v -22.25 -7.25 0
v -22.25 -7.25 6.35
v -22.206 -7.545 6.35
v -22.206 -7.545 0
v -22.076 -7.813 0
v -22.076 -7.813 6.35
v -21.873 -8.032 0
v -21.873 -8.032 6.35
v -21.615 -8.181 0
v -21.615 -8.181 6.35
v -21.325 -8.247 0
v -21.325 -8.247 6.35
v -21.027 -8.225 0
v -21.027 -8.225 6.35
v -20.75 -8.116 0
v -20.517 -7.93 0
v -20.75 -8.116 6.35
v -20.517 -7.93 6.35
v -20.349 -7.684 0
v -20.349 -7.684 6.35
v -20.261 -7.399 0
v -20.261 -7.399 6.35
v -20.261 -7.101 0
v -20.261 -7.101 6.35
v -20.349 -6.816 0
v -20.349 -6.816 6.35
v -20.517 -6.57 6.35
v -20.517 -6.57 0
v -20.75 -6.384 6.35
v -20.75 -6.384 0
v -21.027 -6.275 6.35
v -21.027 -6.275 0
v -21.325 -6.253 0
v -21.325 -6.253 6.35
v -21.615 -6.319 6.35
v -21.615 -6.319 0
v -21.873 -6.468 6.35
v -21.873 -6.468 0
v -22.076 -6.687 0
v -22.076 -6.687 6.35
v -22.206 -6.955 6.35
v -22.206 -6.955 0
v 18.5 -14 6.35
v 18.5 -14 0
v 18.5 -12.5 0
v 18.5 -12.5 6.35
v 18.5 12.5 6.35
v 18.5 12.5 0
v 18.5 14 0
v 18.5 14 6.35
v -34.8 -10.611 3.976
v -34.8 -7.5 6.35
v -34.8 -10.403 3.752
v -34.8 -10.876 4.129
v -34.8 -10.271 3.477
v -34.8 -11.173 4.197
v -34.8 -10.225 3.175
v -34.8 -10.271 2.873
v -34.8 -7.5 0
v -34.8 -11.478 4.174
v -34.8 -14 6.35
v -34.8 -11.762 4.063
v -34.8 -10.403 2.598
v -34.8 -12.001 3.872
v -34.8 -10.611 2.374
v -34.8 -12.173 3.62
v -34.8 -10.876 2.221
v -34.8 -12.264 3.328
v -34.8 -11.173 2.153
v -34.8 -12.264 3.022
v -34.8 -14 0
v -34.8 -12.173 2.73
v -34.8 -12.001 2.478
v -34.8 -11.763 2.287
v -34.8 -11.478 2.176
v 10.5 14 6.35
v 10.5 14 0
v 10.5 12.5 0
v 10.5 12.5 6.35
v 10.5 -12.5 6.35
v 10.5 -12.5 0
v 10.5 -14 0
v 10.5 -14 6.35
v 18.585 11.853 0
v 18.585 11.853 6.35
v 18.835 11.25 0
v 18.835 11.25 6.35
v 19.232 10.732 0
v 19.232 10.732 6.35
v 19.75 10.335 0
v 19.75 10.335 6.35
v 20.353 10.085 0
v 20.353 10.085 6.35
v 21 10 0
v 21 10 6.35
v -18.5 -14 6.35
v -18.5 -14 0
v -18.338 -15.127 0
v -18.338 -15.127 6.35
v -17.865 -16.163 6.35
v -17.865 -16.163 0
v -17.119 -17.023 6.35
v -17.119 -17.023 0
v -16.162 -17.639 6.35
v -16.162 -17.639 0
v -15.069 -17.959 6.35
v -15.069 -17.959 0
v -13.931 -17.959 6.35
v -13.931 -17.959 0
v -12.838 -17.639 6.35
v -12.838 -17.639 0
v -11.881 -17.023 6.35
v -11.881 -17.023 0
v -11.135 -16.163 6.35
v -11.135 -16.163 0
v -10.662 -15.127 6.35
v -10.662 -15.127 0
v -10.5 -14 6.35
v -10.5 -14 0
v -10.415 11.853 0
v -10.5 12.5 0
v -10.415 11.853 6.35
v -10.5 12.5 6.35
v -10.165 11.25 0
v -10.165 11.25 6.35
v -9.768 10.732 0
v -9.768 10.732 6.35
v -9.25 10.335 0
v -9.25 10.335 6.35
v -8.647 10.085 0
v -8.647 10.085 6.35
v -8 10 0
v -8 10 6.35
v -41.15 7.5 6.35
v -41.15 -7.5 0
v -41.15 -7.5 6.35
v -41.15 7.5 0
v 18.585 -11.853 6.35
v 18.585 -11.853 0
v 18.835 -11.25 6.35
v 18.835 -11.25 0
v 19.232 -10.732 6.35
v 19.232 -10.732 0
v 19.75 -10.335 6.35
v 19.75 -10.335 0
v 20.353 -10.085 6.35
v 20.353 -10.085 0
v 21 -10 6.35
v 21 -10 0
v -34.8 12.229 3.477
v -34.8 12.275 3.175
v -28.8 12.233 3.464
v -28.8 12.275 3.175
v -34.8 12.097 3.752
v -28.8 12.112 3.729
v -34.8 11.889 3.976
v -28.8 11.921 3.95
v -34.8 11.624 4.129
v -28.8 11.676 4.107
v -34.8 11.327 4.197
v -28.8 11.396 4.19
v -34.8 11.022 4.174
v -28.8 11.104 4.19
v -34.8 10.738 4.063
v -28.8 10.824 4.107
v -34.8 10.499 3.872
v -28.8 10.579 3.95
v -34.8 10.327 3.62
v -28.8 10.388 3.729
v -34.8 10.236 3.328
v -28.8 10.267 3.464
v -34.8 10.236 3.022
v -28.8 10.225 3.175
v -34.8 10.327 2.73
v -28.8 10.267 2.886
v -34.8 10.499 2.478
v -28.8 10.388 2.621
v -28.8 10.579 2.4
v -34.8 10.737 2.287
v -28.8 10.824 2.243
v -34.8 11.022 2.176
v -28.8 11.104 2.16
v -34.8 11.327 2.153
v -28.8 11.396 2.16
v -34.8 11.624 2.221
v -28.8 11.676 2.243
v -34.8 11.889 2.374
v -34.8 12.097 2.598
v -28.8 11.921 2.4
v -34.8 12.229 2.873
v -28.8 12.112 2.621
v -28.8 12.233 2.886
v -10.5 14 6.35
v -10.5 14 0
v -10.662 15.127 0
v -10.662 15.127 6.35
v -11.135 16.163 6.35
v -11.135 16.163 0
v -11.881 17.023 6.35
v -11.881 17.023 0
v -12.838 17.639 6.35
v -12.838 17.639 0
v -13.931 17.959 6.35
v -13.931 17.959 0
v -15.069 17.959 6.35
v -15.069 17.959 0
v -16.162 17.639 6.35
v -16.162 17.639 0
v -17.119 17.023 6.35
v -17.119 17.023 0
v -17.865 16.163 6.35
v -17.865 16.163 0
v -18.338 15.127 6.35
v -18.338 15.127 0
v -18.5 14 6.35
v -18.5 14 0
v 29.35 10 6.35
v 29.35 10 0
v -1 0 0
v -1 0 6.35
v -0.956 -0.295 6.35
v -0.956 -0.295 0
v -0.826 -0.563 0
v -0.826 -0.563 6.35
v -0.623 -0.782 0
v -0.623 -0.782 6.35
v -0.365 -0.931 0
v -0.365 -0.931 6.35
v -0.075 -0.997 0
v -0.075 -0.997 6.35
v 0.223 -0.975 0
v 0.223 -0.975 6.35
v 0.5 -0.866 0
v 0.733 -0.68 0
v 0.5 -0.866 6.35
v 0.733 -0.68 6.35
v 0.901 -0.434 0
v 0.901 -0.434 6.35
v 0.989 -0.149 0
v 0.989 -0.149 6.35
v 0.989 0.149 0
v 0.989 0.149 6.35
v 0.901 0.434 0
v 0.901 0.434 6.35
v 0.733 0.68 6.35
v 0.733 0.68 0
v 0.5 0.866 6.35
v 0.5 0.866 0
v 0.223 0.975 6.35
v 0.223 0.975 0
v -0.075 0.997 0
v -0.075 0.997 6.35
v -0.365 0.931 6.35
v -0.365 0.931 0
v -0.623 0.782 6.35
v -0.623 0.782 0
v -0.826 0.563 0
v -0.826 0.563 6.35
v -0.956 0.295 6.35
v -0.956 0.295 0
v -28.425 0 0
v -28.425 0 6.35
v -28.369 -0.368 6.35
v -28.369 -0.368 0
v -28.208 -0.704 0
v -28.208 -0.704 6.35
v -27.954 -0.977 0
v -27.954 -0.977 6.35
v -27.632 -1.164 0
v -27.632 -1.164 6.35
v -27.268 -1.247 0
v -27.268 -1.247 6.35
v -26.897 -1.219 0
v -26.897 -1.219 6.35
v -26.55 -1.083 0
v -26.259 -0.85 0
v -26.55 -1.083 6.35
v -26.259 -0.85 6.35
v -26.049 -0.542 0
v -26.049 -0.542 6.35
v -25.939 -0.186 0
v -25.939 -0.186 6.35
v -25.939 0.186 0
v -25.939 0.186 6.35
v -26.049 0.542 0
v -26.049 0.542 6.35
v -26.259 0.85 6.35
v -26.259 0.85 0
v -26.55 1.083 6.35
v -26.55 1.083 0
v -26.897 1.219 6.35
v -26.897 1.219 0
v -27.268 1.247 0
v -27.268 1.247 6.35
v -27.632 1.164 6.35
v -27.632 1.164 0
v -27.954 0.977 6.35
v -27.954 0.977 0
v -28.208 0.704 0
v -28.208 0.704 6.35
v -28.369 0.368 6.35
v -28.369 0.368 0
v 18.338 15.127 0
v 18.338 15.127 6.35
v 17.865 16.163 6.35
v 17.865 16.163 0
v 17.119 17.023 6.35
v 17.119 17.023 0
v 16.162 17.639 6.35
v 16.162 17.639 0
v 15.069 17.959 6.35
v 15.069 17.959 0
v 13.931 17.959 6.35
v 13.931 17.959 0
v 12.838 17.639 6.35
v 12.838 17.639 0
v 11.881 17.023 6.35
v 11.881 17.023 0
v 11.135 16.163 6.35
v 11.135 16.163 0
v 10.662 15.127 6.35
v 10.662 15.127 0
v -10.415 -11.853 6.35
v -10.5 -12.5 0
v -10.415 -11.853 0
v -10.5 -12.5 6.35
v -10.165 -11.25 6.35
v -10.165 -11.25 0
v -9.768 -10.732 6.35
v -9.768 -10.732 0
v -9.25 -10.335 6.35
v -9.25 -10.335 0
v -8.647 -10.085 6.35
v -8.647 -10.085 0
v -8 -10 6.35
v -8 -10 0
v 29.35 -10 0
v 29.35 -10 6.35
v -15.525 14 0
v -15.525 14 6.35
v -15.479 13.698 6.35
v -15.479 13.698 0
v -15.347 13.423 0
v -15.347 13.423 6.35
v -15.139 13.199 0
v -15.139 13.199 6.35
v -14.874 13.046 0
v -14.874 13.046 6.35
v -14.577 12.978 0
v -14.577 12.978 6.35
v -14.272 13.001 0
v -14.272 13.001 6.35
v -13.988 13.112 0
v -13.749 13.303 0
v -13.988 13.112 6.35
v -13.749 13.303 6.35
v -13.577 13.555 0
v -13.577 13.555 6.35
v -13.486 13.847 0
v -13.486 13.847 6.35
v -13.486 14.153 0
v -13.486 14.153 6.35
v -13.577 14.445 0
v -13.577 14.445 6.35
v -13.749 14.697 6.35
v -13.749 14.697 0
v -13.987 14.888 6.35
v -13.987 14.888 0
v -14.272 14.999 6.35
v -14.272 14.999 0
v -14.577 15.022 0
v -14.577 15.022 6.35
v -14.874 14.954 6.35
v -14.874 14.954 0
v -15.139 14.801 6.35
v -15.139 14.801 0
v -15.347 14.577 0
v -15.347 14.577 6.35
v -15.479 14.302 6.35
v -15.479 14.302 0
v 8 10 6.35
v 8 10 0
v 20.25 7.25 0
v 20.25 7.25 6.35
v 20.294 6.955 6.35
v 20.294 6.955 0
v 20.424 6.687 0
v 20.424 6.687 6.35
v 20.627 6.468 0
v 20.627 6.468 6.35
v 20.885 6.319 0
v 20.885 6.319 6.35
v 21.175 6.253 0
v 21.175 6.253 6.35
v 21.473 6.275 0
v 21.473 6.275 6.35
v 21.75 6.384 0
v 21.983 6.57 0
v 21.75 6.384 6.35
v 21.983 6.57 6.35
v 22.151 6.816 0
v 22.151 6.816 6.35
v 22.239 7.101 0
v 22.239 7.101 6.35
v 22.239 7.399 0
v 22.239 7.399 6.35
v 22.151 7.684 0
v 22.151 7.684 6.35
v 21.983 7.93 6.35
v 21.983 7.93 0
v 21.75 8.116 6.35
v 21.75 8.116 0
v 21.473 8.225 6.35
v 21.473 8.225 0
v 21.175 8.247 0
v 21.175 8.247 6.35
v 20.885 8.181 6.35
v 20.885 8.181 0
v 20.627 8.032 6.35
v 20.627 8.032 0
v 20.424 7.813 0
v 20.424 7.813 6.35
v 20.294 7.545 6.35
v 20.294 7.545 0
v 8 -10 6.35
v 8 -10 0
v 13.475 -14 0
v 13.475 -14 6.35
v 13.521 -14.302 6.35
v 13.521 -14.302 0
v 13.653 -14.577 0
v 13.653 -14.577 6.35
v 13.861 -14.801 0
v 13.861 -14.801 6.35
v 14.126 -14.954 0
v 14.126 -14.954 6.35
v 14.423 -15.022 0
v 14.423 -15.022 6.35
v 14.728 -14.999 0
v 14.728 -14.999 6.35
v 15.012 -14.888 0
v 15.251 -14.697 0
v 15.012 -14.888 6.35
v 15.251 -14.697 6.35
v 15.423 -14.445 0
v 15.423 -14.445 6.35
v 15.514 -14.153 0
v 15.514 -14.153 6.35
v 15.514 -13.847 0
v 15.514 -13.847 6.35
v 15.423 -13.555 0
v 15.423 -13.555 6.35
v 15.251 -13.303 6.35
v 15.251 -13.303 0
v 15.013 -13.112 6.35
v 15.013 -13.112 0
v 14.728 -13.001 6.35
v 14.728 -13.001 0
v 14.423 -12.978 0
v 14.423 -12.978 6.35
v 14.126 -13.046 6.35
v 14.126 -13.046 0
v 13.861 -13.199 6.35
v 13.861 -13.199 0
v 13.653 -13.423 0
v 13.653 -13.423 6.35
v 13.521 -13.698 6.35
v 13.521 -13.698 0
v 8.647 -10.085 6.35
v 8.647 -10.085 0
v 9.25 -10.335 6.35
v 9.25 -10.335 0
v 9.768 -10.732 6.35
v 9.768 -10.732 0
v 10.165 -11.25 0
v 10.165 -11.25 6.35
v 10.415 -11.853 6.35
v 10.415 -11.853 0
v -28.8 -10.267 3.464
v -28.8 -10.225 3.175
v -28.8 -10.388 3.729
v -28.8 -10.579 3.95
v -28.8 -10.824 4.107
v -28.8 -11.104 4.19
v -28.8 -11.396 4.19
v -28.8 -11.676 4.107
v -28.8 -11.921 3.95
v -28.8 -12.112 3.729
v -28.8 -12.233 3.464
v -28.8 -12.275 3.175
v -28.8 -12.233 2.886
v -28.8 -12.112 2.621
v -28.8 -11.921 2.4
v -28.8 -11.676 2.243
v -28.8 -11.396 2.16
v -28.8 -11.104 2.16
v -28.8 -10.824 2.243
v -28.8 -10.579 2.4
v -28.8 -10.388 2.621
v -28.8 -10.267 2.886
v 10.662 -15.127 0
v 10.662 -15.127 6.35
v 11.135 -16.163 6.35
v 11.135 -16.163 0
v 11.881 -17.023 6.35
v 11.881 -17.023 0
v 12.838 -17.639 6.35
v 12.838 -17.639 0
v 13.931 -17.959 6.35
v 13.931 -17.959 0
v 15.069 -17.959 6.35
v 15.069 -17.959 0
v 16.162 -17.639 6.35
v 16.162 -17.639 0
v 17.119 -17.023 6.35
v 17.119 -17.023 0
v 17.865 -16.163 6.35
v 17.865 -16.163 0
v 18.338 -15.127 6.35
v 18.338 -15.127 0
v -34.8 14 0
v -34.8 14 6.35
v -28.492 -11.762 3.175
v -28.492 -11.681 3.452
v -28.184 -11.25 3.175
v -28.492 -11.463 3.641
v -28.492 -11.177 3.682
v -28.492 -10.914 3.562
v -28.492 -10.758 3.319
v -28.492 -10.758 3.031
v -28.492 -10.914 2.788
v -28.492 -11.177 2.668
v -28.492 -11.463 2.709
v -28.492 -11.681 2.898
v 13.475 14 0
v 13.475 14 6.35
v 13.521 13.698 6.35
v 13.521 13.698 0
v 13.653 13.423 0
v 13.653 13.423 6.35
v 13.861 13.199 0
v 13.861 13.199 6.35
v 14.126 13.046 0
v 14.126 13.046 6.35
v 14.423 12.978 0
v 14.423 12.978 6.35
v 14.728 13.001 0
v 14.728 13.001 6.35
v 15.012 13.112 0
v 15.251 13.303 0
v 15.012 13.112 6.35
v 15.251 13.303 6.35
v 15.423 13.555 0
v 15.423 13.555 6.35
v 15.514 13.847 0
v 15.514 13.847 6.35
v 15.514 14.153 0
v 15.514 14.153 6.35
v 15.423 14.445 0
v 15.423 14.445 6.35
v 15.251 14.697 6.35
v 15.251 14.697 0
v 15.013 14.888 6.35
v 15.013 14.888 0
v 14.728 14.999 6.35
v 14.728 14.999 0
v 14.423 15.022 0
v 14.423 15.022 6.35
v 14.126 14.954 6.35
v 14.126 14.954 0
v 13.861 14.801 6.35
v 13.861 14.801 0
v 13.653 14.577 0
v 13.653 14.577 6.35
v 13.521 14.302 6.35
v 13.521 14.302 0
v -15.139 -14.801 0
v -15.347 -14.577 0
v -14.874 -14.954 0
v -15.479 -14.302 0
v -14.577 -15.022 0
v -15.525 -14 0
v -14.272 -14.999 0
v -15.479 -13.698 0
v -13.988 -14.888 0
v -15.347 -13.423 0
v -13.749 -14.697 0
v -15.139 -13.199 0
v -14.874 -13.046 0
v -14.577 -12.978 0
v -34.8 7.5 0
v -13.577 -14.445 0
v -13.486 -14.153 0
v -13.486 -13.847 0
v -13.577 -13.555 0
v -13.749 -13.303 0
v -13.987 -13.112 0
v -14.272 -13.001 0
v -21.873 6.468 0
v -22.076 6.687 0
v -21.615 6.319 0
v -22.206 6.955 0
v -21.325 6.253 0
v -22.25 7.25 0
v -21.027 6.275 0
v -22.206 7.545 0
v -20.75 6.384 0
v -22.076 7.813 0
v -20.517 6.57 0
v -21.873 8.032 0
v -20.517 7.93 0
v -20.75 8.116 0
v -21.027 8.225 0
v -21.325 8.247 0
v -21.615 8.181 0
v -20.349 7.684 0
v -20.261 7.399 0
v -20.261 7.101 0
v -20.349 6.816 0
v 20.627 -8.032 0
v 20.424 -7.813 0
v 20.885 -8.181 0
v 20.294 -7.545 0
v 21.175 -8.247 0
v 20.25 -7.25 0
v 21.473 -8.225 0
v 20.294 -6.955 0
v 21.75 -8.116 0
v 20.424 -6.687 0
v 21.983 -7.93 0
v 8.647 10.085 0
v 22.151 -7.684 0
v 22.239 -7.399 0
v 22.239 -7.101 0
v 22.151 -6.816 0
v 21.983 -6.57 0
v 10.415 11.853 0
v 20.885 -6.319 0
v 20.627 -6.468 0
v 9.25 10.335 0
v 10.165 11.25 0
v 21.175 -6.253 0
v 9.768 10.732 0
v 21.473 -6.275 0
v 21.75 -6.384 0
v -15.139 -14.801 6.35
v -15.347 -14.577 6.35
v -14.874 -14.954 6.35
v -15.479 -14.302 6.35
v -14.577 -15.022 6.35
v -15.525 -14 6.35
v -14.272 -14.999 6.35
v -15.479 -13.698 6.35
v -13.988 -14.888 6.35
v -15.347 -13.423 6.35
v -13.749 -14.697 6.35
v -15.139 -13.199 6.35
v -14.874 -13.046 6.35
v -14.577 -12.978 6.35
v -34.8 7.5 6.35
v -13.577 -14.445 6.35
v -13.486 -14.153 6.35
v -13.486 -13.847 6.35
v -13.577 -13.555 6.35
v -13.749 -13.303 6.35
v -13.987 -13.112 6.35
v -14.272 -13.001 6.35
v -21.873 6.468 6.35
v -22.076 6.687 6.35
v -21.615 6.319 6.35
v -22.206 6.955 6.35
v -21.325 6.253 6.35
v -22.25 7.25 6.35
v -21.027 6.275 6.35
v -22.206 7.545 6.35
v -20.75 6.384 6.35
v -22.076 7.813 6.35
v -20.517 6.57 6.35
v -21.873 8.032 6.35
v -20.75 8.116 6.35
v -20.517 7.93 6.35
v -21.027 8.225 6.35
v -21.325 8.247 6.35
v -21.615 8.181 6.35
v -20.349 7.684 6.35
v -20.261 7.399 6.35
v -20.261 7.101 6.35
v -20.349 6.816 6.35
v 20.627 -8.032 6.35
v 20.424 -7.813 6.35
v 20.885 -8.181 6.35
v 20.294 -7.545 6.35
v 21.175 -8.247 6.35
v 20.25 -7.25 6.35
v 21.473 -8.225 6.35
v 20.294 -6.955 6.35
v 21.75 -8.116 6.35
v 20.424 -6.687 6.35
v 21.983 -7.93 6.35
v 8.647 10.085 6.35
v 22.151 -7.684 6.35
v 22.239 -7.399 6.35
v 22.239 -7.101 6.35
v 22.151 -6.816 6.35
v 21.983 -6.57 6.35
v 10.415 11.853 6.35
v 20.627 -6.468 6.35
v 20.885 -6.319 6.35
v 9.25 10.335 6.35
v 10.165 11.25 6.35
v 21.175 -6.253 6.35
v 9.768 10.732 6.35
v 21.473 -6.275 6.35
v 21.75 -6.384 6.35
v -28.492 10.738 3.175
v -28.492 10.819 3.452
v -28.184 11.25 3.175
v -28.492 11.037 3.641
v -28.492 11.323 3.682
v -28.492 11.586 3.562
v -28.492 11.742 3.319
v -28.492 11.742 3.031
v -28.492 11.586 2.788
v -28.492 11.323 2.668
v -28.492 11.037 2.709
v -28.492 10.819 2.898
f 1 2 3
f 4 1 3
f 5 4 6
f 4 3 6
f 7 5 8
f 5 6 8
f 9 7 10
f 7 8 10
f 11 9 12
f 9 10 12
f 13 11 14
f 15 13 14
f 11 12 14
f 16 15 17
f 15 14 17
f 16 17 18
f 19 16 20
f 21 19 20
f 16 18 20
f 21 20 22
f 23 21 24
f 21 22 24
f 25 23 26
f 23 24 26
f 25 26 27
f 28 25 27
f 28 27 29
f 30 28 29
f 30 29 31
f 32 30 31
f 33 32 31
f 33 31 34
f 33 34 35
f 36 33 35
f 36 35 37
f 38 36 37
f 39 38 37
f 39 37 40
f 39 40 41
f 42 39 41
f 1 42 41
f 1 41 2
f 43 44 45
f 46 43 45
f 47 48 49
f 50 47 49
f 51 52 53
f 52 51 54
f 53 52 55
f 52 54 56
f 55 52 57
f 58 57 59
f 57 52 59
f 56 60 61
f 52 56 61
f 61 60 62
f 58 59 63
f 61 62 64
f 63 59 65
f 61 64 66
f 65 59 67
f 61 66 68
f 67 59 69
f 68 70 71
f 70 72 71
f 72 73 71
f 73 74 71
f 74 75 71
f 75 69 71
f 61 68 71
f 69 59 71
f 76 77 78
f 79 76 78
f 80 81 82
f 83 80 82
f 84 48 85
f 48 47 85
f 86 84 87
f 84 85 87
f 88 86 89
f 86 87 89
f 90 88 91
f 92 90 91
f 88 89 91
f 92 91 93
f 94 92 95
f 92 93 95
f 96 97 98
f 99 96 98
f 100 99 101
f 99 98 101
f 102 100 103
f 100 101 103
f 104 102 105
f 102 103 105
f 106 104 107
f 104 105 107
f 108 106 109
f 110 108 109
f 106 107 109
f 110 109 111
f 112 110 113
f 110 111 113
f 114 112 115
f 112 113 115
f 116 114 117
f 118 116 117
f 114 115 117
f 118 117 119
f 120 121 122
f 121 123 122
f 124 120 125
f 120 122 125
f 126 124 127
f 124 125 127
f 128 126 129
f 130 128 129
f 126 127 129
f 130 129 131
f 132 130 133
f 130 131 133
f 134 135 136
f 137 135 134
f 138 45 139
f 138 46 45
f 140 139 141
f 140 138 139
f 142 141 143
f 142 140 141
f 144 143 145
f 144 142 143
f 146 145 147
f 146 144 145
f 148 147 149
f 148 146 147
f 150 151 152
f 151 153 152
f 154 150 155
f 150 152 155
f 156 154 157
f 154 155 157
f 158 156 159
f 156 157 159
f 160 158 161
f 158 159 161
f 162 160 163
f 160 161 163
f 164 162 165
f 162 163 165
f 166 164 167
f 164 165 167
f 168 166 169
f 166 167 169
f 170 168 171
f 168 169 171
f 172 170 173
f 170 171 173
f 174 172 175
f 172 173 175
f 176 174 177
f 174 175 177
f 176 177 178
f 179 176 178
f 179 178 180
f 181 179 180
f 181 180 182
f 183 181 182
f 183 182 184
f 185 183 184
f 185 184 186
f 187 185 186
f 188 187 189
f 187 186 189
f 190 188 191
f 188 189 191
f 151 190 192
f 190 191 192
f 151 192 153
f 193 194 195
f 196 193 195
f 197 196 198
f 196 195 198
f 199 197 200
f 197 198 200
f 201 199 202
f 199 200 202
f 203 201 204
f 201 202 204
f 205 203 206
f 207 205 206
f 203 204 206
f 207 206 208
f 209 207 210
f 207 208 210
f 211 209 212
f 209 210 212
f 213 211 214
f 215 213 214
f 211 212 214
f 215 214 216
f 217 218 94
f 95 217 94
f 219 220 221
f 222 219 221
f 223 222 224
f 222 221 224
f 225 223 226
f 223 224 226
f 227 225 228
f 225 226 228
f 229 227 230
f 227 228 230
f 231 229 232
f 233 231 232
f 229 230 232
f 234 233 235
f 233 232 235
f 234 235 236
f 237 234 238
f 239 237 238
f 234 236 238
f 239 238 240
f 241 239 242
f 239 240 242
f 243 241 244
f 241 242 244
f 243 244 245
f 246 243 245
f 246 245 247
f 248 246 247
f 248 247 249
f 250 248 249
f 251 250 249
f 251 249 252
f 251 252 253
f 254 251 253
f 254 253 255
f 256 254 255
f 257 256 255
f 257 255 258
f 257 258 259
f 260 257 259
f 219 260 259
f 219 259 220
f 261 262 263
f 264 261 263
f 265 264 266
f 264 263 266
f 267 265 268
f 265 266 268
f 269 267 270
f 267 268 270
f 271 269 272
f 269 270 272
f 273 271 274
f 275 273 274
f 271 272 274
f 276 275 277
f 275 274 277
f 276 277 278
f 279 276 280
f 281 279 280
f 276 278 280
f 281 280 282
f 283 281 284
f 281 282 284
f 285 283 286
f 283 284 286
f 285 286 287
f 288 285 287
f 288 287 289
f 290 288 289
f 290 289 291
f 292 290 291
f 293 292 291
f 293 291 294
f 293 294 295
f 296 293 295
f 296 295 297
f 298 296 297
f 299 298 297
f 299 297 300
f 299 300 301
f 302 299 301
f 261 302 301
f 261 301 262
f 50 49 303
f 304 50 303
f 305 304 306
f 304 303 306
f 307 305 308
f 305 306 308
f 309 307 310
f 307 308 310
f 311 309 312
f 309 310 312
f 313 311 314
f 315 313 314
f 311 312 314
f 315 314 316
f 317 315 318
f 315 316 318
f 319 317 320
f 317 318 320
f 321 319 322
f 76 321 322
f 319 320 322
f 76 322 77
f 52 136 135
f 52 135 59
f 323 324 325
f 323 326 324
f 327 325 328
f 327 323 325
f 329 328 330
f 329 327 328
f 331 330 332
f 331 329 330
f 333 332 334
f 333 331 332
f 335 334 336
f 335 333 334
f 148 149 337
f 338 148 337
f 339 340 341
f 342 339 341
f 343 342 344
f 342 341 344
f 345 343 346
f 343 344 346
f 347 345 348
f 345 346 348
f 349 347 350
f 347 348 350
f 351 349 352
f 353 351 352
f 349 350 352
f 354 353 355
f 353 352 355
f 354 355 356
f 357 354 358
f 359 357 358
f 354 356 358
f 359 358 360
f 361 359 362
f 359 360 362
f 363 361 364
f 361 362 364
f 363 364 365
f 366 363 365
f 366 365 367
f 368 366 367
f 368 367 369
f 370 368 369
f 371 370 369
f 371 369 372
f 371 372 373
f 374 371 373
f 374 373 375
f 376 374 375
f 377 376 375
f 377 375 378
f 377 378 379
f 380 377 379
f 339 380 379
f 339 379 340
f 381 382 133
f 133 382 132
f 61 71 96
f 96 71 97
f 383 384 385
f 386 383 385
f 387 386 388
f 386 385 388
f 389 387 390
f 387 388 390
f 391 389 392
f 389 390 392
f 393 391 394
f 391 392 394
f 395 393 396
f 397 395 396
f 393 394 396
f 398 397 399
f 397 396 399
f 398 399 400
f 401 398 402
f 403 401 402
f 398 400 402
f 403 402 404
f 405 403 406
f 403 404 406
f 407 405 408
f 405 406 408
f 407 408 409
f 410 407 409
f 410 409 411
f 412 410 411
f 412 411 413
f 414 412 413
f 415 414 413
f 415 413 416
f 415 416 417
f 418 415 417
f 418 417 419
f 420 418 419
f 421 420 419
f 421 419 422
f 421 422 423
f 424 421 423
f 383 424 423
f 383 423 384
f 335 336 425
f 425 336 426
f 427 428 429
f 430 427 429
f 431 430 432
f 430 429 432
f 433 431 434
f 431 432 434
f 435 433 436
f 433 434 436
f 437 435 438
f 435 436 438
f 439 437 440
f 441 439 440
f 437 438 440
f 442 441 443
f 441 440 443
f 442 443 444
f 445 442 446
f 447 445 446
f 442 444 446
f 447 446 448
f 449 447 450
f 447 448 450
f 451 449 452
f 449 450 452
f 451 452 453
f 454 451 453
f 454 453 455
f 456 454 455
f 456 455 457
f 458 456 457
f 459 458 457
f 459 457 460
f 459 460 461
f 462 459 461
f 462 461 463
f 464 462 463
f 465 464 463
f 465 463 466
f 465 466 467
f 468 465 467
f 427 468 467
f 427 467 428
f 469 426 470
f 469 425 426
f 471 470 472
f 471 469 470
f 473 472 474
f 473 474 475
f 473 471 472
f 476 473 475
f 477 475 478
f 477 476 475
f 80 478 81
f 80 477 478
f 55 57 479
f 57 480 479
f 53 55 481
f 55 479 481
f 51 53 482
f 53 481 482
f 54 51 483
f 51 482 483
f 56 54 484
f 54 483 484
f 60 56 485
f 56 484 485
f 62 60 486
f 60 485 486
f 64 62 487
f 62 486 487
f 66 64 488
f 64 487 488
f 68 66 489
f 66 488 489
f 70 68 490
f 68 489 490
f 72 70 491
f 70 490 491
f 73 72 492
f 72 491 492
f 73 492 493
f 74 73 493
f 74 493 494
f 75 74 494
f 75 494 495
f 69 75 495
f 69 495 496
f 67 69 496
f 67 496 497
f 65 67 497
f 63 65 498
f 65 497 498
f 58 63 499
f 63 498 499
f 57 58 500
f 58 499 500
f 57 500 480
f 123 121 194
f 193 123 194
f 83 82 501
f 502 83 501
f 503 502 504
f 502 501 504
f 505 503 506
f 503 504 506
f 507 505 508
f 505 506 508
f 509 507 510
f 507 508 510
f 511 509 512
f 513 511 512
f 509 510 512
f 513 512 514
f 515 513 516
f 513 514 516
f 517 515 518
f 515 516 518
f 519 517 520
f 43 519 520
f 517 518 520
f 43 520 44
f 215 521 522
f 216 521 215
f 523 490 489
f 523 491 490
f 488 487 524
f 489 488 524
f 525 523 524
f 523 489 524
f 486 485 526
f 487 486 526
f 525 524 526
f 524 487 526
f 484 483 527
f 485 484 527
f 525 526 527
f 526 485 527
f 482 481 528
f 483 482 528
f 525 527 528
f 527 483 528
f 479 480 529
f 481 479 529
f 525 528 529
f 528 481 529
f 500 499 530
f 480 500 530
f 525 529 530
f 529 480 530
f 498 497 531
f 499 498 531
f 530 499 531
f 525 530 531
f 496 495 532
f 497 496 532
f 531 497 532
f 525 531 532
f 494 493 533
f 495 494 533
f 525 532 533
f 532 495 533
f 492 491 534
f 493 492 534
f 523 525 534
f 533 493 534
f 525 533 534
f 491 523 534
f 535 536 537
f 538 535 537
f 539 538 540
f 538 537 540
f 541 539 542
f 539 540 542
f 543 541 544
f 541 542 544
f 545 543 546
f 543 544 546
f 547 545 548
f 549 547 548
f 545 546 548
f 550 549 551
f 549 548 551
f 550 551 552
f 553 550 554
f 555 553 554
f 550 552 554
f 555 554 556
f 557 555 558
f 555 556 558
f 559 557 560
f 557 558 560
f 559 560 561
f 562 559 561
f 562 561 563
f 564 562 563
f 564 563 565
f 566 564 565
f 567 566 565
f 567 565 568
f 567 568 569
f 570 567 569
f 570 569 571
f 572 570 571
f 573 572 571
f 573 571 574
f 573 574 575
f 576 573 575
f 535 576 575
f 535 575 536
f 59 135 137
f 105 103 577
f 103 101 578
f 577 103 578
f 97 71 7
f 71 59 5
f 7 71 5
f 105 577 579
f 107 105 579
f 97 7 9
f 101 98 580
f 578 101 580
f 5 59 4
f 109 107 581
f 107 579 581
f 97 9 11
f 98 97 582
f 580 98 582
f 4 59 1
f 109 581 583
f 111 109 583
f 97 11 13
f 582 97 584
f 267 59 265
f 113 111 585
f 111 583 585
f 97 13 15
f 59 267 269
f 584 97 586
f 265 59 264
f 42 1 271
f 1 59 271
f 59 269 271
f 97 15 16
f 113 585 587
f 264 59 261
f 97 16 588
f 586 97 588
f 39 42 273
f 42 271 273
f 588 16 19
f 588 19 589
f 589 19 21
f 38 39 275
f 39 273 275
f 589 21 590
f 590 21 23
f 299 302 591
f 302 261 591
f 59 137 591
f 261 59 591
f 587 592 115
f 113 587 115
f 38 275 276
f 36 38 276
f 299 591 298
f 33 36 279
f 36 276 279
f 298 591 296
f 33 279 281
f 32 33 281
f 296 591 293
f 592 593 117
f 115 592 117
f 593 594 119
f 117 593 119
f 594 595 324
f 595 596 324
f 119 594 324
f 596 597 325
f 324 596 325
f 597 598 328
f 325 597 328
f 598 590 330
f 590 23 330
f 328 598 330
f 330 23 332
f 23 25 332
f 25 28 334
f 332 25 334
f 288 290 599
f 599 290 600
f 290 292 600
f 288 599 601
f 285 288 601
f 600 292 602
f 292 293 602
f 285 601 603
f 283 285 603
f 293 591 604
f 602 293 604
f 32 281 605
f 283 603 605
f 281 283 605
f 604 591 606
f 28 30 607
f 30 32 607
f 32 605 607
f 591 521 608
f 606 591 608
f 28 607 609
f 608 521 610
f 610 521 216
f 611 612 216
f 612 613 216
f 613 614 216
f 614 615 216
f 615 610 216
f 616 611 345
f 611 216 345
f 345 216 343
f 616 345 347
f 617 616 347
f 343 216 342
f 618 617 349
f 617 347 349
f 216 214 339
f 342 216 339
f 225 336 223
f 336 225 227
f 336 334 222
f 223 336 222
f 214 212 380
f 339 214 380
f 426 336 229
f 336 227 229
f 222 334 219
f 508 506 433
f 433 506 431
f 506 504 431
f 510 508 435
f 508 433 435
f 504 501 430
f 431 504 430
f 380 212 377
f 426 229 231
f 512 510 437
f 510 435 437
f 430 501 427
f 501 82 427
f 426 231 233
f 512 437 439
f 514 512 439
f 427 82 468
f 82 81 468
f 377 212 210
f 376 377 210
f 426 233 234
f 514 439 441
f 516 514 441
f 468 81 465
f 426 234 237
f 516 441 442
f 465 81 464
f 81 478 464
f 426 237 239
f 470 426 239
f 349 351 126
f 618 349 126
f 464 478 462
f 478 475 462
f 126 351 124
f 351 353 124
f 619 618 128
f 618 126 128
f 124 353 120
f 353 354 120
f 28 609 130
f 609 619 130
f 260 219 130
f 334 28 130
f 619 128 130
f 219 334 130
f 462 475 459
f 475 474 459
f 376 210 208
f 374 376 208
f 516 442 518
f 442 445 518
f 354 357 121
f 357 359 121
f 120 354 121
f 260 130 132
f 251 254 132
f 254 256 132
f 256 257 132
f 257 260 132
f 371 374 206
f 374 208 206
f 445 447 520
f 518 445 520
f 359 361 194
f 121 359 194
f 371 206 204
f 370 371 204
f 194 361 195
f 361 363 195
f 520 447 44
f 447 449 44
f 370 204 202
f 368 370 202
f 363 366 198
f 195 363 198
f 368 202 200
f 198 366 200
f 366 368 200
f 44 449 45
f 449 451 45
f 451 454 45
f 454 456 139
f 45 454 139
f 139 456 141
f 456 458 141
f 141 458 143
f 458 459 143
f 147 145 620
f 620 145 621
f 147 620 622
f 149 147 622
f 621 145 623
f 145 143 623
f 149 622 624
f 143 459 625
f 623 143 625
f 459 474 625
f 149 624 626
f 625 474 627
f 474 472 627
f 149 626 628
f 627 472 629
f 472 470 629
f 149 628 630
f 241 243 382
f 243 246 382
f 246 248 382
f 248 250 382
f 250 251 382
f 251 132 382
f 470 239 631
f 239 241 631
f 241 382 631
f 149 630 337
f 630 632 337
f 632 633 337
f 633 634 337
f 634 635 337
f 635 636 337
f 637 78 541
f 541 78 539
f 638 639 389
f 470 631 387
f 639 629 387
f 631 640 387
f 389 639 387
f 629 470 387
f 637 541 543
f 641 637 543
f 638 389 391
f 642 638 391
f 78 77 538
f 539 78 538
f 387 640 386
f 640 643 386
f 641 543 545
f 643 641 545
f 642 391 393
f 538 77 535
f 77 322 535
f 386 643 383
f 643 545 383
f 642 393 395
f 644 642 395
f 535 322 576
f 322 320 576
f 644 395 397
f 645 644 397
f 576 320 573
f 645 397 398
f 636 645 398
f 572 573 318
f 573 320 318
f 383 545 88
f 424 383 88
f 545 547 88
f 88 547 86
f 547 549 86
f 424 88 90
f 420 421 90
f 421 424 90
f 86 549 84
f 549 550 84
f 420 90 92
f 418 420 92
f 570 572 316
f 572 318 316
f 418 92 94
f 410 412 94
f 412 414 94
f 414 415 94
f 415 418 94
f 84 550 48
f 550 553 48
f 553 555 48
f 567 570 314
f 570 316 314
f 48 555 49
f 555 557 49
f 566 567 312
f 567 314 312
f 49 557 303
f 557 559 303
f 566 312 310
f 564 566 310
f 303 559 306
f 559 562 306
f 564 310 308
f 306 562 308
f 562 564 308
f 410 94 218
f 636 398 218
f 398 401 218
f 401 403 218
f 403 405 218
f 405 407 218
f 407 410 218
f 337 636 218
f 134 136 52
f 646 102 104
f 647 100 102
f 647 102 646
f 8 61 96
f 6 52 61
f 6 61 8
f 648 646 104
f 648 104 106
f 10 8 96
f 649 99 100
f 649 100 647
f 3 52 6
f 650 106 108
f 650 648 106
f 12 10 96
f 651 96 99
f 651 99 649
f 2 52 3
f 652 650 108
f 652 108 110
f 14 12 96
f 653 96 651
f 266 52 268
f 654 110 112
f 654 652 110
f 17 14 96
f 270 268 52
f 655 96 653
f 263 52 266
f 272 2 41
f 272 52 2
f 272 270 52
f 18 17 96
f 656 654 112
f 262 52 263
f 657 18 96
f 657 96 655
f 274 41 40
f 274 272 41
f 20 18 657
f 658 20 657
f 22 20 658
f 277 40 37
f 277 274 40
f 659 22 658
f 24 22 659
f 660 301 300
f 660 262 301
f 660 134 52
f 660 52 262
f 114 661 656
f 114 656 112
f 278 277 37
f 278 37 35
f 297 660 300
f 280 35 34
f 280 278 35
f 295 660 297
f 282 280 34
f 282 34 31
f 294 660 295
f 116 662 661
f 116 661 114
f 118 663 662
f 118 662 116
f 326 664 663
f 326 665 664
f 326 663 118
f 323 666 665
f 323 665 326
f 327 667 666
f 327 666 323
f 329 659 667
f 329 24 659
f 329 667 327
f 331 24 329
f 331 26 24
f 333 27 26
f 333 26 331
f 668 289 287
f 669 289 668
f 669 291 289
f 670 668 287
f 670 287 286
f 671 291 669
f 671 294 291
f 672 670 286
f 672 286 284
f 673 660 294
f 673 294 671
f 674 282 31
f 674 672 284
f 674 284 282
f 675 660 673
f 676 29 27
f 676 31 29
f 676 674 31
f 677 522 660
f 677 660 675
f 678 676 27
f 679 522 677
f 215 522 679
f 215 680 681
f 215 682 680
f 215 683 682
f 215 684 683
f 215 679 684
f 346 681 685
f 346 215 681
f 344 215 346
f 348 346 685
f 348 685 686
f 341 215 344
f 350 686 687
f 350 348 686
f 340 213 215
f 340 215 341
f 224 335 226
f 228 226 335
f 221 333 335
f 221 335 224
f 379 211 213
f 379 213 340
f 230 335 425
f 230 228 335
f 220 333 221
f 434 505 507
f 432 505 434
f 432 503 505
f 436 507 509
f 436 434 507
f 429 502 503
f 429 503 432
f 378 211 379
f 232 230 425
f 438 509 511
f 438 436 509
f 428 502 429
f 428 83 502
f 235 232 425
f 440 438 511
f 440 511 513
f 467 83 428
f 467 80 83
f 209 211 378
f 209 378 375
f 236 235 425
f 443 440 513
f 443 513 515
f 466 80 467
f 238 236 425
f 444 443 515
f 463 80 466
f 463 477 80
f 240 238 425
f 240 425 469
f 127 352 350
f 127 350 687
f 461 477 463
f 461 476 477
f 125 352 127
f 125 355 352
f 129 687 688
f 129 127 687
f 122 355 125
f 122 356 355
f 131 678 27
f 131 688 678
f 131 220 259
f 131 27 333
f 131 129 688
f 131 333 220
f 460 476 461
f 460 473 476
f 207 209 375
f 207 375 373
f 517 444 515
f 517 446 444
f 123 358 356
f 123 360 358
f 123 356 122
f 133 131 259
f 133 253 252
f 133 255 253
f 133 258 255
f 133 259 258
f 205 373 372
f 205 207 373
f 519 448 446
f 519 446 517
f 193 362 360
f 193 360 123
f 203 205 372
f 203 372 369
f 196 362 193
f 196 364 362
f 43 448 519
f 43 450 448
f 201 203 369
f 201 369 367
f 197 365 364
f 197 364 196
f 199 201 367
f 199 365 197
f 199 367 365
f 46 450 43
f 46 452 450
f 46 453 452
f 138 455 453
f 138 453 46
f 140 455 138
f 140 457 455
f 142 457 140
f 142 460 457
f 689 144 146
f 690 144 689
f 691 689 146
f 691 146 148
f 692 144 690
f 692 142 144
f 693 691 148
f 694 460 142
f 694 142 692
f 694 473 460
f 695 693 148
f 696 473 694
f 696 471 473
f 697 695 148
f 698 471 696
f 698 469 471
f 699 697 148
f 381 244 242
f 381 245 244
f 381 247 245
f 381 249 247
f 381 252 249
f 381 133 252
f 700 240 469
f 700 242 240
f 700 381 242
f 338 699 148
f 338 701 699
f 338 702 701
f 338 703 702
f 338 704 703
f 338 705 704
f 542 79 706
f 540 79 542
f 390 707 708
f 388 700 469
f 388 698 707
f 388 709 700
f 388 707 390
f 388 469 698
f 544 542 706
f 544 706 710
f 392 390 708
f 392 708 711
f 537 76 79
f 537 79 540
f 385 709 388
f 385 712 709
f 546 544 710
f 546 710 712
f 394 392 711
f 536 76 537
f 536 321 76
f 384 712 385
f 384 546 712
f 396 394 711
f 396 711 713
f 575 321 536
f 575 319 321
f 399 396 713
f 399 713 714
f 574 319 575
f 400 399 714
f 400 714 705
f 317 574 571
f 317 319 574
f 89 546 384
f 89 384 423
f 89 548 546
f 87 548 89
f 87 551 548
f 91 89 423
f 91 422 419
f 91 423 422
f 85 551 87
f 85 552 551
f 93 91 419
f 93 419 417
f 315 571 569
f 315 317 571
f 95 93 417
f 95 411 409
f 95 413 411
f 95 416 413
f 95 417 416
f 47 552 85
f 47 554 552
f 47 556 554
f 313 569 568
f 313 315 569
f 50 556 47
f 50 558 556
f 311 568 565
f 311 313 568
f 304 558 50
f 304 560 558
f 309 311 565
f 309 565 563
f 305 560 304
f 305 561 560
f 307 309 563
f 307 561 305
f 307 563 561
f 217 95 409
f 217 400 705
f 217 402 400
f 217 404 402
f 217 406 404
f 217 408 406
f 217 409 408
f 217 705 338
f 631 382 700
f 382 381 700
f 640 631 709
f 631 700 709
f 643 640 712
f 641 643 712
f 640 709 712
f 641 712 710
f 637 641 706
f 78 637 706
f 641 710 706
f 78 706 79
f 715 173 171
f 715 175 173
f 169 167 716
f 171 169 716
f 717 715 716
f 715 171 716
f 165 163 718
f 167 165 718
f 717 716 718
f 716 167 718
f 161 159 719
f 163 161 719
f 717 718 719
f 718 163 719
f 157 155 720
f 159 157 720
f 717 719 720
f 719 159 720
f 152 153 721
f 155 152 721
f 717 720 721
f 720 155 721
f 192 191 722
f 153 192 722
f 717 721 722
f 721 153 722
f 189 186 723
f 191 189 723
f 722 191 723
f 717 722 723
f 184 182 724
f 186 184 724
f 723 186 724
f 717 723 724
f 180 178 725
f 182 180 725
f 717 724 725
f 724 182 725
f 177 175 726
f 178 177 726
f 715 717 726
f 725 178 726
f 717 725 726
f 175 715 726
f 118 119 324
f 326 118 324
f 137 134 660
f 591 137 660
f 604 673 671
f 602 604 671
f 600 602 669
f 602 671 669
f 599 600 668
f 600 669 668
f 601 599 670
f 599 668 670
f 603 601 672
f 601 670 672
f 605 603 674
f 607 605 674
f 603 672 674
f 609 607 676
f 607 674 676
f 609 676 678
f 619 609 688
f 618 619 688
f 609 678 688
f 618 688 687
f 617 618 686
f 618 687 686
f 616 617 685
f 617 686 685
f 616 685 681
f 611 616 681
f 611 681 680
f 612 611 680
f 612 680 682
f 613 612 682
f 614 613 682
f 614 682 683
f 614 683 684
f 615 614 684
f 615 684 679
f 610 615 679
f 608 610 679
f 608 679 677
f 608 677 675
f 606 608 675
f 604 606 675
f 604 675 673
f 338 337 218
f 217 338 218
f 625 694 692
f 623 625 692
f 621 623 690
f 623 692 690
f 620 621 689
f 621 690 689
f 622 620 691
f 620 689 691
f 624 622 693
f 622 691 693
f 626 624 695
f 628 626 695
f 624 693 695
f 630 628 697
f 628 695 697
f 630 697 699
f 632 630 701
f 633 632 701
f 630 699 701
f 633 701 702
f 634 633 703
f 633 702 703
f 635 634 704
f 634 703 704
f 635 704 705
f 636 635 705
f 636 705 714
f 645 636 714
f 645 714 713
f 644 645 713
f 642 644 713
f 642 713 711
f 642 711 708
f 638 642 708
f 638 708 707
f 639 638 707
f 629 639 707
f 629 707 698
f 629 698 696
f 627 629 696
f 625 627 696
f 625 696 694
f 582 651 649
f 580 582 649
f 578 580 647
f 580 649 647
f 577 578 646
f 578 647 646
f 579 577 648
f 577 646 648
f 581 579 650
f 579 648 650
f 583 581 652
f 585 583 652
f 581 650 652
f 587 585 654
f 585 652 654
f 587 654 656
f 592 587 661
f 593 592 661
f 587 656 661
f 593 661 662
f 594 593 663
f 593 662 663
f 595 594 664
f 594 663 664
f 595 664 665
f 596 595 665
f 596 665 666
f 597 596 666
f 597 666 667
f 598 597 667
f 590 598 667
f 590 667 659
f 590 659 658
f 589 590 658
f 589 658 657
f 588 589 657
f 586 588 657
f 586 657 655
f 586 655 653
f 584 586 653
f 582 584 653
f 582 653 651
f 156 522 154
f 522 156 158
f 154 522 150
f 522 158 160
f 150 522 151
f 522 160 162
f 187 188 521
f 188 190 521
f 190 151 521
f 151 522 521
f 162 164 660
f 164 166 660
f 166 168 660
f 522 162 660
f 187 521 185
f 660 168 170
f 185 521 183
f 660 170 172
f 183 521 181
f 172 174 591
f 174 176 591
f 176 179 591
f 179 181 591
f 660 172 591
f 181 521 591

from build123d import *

# Parameters (mm, degrees)
F0_W           = 6.35
F0_H           = 15
F0_W_2         = 16.3
F0_H_2         = 4
F1_DEPTH       = 6.35
F2_D           = 2.05
F3_D           = 2.5
F4_R           = 2.5
F7_D           = 2.05
F7_DEPTH       = 6
F7_TIP         = 0.6158821345
F7_ON_F5_D     = 2.05
F7_ON_F5_DEPTH = 6
F7_ON_F5_TIP   = 0.6158821345
F8_D           = 2


# Not quite as in the source:
# - a length typed as a fraction of an inch, garbled in the dataset ("3 / 203.2 mm" for 3/8 in), is restored
# - a feature names something its author has since deleted; it is built from what else it names


with BuildPart() as f1:
    # F0 (on Top) → F1 (new body)
    with BuildSketch(Plane.XY):
        Polygon((-18.5, 10), (-34.8, 10), (-34.8, 7.5), (-34.8, -7.5), (-34.8, -10), (-18.5, -10), (-14.5, -10), (-11.8, -10), (-10.5, -10), (10.5, -10), (14.5, -10), (18.5, -10), (29.35, -10), (29.35, 10), (18.5, 10), (14.5000000137, 10), (10.5, 10), (-10.5, 10), (-14.5, 10), align=None)
        with Locations((-37.975, 0)):
            Rectangle(F0_W, F0_H)
        with BuildLine():
            Line((-18.5, 14), (-18.5, 10))
            Line((-18.5, 10), (-14.5, 10))
            ThreePointArc((-14.5, 10), (-17.3284271247, 11.1715728753), (-18.5, 14))
        make_face()
        with BuildLine():
            ThreePointArc((-10.5, 14), (-11.6715728753, 11.1715728753), (-14.5, 10))
            Line((-14.5, 10), (-10.5, 10))
            Line((-10.5, 10), (-10.5, 14))
        make_face()
        with BuildLine():
            ThreePointArc((-18.5, 14), (-17.3284271247, 11.1715728753), (-14.5, 10))
            ThreePointArc((-14.5, 10), (-11.6715728753, 11.1715728753), (-10.5, 14))
            Line((-10.5, 14), (-18.5, 14))
        make_face()
        with BuildLine():
            ThreePointArc((-10.5, 14), (-14.5, 18), (-18.5, 14))
            Line((-18.5, 14), (-10.5, 14))
        make_face()
        with BuildLine():
            Line((10.5, 14), (10.5, 10))
            Line((10.5, 10), (14.5000000137, 10))
            ThreePointArc((14.5000000137, 10), (11.6715728801, 11.1715728704), (10.5, 14))
        make_face()
        with BuildLine():
            ThreePointArc((10.5, 14), (11.6715728801, 11.1715728704), (14.5000000137, 10))
            ThreePointArc((14.5000000137, 10), (17.3284271296, 11.1715728801), (18.5, 14))
            ThreePointArc((18.5, 14), (14.5, 18), (10.5, 14))
        make_face()
        with BuildLine():
            ThreePointArc((18.5, 14), (17.3284271296, 11.1715728801), (14.5000000137, 10))
            Line((14.5000000137, 10), (18.5, 10))
            Line((18.5, 10), (18.5, 14))
        make_face()
        with BuildLine():
            ThreePointArc((18.5, -14), (17.3284271247, -11.1715728753), (14.5, -10))
            ThreePointArc((14.5, -10), (11.6715728753, -11.1715728753), (10.5, -14))
            ThreePointArc((10.5, -14), (14.5, -18), (18.5, -14))
        make_face()
        with BuildLine():
            Line((18.5, -14), (18.5, -10))
            Line((18.5, -10), (14.5, -10))
            ThreePointArc((14.5, -10), (17.3284271247, -11.1715728753), (18.5, -14))
        make_face()
        with BuildLine():
            Line((14.5, -10), (10.5, -10))
            Line((10.5, -10), (10.5, -14))
            ThreePointArc((10.5, -14), (11.6715728753, -11.1715728753), (14.5, -10))
        make_face()
        with BuildLine():
            ThreePointArc((-10.5, -14), (-11.6715728753, -11.1715728753), (-14.5, -10))
            ThreePointArc((-14.5, -10), (-17.3284271247, -11.1715728753), (-18.5, -14))
            ThreePointArc((-18.5, -14), (-14.5, -18), (-10.5, -14))
        make_face()
        with BuildLine():
            Line((-11.8, -10), (-14.5, -10))
            ThreePointArc((-14.5, -10), (-11.6715728753, -11.1715728753), (-10.5, -14))
            Line((-10.5, -14), (-10.5, -10))
            Line((-10.5, -10), (-11.8, -10))
        make_face()
        with BuildLine():
            Line((-14.5, -10), (-18.5, -10))
            Line((-18.5, -10), (-18.5, -14))
            ThreePointArc((-18.5, -14), (-17.3284271247, -11.1715728753), (-14.5, -10))
        make_face()
        with Locations((-26.65, 12)):
            Rectangle(F0_W_2, F0_H_2)
        with Locations((-26.65, -12)):
            Rectangle(F0_W_2, F0_H_2)
    extrude(amount=F1_DEPTH)

    # F2 (through all)
    with Locations(Plane(origin=(0, 0, 0), x_dir=(1, 0, 0), z_dir=(0, 0, -1))):
        with Locations((-14.5, -14), (14.5, -14), (14.5, 14), (-14.5, 14)):
            Hole(F2_D / 2)

    # F3 (through all)
    with Locations(Plane(origin=(0, 0, 0), x_dir=(1, 0, 0), z_dir=(0, 0, -1))):
        with Locations((-27.175, 0)):
            Hole(F3_D / 2)

    # F4
    f4_edges = [f1.edges().sort_by_distance(p)[0] for p in [
        (-10.5, 10, 3.175),
        (10.5, 10, 3.175),
        (18.5, 10, 3.175),
        (-10.5, -10, 3.175),
        (10.5, -10, 3.175),
        (18.5, -10, 3.175),
        (-10.5, 14, 3.175),
    ]]
    fillet(f4_edges, radius=F4_R)

    # F7
    with Locations(Plane(origin=(-34.8, 0, 0), x_dir=(0, -1, 0), z_dir=(-1, 0, 0))):
        with Locations((-11.25, 3.175)):
            Hole(F7_D / 2, depth=F7_DEPTH)
            with Locations((0, 0, -(F7_DEPTH + F7_TIP / 2))):  # 118° drill point
                Cone(0, F7_D / 2, F7_TIP, mode=Mode.SUBTRACT)

    # F7 on F5
    with Locations(Plane(origin=(-34.8, 0, 0), x_dir=(0, -1, 0), z_dir=(-1, 0, 0))):
        with Locations((11.25, 3.175)):
            Hole(F7_ON_F5_D / 2, depth=F7_ON_F5_DEPTH)
            with Locations((0, 0, -(F7_ON_F5_DEPTH + F7_ON_F5_TIP / 2))):  # 118° drill point
                Cone(0, F7_ON_F5_D / 2, F7_ON_F5_TIP, mode=Mode.SUBTRACT)

    # F8 (through all)
    with Locations(Plane(origin=(0, 0, 0), x_dir=(1, 0, 0), z_dir=(0, 0, -1))):
        with Locations((-21.25, -7.25), (-21.25, 7.25), (0, 0), (21.25, -7.25), (21.25, 7.25)):
            Hole(F8_D / 2)


solid = f1.part
